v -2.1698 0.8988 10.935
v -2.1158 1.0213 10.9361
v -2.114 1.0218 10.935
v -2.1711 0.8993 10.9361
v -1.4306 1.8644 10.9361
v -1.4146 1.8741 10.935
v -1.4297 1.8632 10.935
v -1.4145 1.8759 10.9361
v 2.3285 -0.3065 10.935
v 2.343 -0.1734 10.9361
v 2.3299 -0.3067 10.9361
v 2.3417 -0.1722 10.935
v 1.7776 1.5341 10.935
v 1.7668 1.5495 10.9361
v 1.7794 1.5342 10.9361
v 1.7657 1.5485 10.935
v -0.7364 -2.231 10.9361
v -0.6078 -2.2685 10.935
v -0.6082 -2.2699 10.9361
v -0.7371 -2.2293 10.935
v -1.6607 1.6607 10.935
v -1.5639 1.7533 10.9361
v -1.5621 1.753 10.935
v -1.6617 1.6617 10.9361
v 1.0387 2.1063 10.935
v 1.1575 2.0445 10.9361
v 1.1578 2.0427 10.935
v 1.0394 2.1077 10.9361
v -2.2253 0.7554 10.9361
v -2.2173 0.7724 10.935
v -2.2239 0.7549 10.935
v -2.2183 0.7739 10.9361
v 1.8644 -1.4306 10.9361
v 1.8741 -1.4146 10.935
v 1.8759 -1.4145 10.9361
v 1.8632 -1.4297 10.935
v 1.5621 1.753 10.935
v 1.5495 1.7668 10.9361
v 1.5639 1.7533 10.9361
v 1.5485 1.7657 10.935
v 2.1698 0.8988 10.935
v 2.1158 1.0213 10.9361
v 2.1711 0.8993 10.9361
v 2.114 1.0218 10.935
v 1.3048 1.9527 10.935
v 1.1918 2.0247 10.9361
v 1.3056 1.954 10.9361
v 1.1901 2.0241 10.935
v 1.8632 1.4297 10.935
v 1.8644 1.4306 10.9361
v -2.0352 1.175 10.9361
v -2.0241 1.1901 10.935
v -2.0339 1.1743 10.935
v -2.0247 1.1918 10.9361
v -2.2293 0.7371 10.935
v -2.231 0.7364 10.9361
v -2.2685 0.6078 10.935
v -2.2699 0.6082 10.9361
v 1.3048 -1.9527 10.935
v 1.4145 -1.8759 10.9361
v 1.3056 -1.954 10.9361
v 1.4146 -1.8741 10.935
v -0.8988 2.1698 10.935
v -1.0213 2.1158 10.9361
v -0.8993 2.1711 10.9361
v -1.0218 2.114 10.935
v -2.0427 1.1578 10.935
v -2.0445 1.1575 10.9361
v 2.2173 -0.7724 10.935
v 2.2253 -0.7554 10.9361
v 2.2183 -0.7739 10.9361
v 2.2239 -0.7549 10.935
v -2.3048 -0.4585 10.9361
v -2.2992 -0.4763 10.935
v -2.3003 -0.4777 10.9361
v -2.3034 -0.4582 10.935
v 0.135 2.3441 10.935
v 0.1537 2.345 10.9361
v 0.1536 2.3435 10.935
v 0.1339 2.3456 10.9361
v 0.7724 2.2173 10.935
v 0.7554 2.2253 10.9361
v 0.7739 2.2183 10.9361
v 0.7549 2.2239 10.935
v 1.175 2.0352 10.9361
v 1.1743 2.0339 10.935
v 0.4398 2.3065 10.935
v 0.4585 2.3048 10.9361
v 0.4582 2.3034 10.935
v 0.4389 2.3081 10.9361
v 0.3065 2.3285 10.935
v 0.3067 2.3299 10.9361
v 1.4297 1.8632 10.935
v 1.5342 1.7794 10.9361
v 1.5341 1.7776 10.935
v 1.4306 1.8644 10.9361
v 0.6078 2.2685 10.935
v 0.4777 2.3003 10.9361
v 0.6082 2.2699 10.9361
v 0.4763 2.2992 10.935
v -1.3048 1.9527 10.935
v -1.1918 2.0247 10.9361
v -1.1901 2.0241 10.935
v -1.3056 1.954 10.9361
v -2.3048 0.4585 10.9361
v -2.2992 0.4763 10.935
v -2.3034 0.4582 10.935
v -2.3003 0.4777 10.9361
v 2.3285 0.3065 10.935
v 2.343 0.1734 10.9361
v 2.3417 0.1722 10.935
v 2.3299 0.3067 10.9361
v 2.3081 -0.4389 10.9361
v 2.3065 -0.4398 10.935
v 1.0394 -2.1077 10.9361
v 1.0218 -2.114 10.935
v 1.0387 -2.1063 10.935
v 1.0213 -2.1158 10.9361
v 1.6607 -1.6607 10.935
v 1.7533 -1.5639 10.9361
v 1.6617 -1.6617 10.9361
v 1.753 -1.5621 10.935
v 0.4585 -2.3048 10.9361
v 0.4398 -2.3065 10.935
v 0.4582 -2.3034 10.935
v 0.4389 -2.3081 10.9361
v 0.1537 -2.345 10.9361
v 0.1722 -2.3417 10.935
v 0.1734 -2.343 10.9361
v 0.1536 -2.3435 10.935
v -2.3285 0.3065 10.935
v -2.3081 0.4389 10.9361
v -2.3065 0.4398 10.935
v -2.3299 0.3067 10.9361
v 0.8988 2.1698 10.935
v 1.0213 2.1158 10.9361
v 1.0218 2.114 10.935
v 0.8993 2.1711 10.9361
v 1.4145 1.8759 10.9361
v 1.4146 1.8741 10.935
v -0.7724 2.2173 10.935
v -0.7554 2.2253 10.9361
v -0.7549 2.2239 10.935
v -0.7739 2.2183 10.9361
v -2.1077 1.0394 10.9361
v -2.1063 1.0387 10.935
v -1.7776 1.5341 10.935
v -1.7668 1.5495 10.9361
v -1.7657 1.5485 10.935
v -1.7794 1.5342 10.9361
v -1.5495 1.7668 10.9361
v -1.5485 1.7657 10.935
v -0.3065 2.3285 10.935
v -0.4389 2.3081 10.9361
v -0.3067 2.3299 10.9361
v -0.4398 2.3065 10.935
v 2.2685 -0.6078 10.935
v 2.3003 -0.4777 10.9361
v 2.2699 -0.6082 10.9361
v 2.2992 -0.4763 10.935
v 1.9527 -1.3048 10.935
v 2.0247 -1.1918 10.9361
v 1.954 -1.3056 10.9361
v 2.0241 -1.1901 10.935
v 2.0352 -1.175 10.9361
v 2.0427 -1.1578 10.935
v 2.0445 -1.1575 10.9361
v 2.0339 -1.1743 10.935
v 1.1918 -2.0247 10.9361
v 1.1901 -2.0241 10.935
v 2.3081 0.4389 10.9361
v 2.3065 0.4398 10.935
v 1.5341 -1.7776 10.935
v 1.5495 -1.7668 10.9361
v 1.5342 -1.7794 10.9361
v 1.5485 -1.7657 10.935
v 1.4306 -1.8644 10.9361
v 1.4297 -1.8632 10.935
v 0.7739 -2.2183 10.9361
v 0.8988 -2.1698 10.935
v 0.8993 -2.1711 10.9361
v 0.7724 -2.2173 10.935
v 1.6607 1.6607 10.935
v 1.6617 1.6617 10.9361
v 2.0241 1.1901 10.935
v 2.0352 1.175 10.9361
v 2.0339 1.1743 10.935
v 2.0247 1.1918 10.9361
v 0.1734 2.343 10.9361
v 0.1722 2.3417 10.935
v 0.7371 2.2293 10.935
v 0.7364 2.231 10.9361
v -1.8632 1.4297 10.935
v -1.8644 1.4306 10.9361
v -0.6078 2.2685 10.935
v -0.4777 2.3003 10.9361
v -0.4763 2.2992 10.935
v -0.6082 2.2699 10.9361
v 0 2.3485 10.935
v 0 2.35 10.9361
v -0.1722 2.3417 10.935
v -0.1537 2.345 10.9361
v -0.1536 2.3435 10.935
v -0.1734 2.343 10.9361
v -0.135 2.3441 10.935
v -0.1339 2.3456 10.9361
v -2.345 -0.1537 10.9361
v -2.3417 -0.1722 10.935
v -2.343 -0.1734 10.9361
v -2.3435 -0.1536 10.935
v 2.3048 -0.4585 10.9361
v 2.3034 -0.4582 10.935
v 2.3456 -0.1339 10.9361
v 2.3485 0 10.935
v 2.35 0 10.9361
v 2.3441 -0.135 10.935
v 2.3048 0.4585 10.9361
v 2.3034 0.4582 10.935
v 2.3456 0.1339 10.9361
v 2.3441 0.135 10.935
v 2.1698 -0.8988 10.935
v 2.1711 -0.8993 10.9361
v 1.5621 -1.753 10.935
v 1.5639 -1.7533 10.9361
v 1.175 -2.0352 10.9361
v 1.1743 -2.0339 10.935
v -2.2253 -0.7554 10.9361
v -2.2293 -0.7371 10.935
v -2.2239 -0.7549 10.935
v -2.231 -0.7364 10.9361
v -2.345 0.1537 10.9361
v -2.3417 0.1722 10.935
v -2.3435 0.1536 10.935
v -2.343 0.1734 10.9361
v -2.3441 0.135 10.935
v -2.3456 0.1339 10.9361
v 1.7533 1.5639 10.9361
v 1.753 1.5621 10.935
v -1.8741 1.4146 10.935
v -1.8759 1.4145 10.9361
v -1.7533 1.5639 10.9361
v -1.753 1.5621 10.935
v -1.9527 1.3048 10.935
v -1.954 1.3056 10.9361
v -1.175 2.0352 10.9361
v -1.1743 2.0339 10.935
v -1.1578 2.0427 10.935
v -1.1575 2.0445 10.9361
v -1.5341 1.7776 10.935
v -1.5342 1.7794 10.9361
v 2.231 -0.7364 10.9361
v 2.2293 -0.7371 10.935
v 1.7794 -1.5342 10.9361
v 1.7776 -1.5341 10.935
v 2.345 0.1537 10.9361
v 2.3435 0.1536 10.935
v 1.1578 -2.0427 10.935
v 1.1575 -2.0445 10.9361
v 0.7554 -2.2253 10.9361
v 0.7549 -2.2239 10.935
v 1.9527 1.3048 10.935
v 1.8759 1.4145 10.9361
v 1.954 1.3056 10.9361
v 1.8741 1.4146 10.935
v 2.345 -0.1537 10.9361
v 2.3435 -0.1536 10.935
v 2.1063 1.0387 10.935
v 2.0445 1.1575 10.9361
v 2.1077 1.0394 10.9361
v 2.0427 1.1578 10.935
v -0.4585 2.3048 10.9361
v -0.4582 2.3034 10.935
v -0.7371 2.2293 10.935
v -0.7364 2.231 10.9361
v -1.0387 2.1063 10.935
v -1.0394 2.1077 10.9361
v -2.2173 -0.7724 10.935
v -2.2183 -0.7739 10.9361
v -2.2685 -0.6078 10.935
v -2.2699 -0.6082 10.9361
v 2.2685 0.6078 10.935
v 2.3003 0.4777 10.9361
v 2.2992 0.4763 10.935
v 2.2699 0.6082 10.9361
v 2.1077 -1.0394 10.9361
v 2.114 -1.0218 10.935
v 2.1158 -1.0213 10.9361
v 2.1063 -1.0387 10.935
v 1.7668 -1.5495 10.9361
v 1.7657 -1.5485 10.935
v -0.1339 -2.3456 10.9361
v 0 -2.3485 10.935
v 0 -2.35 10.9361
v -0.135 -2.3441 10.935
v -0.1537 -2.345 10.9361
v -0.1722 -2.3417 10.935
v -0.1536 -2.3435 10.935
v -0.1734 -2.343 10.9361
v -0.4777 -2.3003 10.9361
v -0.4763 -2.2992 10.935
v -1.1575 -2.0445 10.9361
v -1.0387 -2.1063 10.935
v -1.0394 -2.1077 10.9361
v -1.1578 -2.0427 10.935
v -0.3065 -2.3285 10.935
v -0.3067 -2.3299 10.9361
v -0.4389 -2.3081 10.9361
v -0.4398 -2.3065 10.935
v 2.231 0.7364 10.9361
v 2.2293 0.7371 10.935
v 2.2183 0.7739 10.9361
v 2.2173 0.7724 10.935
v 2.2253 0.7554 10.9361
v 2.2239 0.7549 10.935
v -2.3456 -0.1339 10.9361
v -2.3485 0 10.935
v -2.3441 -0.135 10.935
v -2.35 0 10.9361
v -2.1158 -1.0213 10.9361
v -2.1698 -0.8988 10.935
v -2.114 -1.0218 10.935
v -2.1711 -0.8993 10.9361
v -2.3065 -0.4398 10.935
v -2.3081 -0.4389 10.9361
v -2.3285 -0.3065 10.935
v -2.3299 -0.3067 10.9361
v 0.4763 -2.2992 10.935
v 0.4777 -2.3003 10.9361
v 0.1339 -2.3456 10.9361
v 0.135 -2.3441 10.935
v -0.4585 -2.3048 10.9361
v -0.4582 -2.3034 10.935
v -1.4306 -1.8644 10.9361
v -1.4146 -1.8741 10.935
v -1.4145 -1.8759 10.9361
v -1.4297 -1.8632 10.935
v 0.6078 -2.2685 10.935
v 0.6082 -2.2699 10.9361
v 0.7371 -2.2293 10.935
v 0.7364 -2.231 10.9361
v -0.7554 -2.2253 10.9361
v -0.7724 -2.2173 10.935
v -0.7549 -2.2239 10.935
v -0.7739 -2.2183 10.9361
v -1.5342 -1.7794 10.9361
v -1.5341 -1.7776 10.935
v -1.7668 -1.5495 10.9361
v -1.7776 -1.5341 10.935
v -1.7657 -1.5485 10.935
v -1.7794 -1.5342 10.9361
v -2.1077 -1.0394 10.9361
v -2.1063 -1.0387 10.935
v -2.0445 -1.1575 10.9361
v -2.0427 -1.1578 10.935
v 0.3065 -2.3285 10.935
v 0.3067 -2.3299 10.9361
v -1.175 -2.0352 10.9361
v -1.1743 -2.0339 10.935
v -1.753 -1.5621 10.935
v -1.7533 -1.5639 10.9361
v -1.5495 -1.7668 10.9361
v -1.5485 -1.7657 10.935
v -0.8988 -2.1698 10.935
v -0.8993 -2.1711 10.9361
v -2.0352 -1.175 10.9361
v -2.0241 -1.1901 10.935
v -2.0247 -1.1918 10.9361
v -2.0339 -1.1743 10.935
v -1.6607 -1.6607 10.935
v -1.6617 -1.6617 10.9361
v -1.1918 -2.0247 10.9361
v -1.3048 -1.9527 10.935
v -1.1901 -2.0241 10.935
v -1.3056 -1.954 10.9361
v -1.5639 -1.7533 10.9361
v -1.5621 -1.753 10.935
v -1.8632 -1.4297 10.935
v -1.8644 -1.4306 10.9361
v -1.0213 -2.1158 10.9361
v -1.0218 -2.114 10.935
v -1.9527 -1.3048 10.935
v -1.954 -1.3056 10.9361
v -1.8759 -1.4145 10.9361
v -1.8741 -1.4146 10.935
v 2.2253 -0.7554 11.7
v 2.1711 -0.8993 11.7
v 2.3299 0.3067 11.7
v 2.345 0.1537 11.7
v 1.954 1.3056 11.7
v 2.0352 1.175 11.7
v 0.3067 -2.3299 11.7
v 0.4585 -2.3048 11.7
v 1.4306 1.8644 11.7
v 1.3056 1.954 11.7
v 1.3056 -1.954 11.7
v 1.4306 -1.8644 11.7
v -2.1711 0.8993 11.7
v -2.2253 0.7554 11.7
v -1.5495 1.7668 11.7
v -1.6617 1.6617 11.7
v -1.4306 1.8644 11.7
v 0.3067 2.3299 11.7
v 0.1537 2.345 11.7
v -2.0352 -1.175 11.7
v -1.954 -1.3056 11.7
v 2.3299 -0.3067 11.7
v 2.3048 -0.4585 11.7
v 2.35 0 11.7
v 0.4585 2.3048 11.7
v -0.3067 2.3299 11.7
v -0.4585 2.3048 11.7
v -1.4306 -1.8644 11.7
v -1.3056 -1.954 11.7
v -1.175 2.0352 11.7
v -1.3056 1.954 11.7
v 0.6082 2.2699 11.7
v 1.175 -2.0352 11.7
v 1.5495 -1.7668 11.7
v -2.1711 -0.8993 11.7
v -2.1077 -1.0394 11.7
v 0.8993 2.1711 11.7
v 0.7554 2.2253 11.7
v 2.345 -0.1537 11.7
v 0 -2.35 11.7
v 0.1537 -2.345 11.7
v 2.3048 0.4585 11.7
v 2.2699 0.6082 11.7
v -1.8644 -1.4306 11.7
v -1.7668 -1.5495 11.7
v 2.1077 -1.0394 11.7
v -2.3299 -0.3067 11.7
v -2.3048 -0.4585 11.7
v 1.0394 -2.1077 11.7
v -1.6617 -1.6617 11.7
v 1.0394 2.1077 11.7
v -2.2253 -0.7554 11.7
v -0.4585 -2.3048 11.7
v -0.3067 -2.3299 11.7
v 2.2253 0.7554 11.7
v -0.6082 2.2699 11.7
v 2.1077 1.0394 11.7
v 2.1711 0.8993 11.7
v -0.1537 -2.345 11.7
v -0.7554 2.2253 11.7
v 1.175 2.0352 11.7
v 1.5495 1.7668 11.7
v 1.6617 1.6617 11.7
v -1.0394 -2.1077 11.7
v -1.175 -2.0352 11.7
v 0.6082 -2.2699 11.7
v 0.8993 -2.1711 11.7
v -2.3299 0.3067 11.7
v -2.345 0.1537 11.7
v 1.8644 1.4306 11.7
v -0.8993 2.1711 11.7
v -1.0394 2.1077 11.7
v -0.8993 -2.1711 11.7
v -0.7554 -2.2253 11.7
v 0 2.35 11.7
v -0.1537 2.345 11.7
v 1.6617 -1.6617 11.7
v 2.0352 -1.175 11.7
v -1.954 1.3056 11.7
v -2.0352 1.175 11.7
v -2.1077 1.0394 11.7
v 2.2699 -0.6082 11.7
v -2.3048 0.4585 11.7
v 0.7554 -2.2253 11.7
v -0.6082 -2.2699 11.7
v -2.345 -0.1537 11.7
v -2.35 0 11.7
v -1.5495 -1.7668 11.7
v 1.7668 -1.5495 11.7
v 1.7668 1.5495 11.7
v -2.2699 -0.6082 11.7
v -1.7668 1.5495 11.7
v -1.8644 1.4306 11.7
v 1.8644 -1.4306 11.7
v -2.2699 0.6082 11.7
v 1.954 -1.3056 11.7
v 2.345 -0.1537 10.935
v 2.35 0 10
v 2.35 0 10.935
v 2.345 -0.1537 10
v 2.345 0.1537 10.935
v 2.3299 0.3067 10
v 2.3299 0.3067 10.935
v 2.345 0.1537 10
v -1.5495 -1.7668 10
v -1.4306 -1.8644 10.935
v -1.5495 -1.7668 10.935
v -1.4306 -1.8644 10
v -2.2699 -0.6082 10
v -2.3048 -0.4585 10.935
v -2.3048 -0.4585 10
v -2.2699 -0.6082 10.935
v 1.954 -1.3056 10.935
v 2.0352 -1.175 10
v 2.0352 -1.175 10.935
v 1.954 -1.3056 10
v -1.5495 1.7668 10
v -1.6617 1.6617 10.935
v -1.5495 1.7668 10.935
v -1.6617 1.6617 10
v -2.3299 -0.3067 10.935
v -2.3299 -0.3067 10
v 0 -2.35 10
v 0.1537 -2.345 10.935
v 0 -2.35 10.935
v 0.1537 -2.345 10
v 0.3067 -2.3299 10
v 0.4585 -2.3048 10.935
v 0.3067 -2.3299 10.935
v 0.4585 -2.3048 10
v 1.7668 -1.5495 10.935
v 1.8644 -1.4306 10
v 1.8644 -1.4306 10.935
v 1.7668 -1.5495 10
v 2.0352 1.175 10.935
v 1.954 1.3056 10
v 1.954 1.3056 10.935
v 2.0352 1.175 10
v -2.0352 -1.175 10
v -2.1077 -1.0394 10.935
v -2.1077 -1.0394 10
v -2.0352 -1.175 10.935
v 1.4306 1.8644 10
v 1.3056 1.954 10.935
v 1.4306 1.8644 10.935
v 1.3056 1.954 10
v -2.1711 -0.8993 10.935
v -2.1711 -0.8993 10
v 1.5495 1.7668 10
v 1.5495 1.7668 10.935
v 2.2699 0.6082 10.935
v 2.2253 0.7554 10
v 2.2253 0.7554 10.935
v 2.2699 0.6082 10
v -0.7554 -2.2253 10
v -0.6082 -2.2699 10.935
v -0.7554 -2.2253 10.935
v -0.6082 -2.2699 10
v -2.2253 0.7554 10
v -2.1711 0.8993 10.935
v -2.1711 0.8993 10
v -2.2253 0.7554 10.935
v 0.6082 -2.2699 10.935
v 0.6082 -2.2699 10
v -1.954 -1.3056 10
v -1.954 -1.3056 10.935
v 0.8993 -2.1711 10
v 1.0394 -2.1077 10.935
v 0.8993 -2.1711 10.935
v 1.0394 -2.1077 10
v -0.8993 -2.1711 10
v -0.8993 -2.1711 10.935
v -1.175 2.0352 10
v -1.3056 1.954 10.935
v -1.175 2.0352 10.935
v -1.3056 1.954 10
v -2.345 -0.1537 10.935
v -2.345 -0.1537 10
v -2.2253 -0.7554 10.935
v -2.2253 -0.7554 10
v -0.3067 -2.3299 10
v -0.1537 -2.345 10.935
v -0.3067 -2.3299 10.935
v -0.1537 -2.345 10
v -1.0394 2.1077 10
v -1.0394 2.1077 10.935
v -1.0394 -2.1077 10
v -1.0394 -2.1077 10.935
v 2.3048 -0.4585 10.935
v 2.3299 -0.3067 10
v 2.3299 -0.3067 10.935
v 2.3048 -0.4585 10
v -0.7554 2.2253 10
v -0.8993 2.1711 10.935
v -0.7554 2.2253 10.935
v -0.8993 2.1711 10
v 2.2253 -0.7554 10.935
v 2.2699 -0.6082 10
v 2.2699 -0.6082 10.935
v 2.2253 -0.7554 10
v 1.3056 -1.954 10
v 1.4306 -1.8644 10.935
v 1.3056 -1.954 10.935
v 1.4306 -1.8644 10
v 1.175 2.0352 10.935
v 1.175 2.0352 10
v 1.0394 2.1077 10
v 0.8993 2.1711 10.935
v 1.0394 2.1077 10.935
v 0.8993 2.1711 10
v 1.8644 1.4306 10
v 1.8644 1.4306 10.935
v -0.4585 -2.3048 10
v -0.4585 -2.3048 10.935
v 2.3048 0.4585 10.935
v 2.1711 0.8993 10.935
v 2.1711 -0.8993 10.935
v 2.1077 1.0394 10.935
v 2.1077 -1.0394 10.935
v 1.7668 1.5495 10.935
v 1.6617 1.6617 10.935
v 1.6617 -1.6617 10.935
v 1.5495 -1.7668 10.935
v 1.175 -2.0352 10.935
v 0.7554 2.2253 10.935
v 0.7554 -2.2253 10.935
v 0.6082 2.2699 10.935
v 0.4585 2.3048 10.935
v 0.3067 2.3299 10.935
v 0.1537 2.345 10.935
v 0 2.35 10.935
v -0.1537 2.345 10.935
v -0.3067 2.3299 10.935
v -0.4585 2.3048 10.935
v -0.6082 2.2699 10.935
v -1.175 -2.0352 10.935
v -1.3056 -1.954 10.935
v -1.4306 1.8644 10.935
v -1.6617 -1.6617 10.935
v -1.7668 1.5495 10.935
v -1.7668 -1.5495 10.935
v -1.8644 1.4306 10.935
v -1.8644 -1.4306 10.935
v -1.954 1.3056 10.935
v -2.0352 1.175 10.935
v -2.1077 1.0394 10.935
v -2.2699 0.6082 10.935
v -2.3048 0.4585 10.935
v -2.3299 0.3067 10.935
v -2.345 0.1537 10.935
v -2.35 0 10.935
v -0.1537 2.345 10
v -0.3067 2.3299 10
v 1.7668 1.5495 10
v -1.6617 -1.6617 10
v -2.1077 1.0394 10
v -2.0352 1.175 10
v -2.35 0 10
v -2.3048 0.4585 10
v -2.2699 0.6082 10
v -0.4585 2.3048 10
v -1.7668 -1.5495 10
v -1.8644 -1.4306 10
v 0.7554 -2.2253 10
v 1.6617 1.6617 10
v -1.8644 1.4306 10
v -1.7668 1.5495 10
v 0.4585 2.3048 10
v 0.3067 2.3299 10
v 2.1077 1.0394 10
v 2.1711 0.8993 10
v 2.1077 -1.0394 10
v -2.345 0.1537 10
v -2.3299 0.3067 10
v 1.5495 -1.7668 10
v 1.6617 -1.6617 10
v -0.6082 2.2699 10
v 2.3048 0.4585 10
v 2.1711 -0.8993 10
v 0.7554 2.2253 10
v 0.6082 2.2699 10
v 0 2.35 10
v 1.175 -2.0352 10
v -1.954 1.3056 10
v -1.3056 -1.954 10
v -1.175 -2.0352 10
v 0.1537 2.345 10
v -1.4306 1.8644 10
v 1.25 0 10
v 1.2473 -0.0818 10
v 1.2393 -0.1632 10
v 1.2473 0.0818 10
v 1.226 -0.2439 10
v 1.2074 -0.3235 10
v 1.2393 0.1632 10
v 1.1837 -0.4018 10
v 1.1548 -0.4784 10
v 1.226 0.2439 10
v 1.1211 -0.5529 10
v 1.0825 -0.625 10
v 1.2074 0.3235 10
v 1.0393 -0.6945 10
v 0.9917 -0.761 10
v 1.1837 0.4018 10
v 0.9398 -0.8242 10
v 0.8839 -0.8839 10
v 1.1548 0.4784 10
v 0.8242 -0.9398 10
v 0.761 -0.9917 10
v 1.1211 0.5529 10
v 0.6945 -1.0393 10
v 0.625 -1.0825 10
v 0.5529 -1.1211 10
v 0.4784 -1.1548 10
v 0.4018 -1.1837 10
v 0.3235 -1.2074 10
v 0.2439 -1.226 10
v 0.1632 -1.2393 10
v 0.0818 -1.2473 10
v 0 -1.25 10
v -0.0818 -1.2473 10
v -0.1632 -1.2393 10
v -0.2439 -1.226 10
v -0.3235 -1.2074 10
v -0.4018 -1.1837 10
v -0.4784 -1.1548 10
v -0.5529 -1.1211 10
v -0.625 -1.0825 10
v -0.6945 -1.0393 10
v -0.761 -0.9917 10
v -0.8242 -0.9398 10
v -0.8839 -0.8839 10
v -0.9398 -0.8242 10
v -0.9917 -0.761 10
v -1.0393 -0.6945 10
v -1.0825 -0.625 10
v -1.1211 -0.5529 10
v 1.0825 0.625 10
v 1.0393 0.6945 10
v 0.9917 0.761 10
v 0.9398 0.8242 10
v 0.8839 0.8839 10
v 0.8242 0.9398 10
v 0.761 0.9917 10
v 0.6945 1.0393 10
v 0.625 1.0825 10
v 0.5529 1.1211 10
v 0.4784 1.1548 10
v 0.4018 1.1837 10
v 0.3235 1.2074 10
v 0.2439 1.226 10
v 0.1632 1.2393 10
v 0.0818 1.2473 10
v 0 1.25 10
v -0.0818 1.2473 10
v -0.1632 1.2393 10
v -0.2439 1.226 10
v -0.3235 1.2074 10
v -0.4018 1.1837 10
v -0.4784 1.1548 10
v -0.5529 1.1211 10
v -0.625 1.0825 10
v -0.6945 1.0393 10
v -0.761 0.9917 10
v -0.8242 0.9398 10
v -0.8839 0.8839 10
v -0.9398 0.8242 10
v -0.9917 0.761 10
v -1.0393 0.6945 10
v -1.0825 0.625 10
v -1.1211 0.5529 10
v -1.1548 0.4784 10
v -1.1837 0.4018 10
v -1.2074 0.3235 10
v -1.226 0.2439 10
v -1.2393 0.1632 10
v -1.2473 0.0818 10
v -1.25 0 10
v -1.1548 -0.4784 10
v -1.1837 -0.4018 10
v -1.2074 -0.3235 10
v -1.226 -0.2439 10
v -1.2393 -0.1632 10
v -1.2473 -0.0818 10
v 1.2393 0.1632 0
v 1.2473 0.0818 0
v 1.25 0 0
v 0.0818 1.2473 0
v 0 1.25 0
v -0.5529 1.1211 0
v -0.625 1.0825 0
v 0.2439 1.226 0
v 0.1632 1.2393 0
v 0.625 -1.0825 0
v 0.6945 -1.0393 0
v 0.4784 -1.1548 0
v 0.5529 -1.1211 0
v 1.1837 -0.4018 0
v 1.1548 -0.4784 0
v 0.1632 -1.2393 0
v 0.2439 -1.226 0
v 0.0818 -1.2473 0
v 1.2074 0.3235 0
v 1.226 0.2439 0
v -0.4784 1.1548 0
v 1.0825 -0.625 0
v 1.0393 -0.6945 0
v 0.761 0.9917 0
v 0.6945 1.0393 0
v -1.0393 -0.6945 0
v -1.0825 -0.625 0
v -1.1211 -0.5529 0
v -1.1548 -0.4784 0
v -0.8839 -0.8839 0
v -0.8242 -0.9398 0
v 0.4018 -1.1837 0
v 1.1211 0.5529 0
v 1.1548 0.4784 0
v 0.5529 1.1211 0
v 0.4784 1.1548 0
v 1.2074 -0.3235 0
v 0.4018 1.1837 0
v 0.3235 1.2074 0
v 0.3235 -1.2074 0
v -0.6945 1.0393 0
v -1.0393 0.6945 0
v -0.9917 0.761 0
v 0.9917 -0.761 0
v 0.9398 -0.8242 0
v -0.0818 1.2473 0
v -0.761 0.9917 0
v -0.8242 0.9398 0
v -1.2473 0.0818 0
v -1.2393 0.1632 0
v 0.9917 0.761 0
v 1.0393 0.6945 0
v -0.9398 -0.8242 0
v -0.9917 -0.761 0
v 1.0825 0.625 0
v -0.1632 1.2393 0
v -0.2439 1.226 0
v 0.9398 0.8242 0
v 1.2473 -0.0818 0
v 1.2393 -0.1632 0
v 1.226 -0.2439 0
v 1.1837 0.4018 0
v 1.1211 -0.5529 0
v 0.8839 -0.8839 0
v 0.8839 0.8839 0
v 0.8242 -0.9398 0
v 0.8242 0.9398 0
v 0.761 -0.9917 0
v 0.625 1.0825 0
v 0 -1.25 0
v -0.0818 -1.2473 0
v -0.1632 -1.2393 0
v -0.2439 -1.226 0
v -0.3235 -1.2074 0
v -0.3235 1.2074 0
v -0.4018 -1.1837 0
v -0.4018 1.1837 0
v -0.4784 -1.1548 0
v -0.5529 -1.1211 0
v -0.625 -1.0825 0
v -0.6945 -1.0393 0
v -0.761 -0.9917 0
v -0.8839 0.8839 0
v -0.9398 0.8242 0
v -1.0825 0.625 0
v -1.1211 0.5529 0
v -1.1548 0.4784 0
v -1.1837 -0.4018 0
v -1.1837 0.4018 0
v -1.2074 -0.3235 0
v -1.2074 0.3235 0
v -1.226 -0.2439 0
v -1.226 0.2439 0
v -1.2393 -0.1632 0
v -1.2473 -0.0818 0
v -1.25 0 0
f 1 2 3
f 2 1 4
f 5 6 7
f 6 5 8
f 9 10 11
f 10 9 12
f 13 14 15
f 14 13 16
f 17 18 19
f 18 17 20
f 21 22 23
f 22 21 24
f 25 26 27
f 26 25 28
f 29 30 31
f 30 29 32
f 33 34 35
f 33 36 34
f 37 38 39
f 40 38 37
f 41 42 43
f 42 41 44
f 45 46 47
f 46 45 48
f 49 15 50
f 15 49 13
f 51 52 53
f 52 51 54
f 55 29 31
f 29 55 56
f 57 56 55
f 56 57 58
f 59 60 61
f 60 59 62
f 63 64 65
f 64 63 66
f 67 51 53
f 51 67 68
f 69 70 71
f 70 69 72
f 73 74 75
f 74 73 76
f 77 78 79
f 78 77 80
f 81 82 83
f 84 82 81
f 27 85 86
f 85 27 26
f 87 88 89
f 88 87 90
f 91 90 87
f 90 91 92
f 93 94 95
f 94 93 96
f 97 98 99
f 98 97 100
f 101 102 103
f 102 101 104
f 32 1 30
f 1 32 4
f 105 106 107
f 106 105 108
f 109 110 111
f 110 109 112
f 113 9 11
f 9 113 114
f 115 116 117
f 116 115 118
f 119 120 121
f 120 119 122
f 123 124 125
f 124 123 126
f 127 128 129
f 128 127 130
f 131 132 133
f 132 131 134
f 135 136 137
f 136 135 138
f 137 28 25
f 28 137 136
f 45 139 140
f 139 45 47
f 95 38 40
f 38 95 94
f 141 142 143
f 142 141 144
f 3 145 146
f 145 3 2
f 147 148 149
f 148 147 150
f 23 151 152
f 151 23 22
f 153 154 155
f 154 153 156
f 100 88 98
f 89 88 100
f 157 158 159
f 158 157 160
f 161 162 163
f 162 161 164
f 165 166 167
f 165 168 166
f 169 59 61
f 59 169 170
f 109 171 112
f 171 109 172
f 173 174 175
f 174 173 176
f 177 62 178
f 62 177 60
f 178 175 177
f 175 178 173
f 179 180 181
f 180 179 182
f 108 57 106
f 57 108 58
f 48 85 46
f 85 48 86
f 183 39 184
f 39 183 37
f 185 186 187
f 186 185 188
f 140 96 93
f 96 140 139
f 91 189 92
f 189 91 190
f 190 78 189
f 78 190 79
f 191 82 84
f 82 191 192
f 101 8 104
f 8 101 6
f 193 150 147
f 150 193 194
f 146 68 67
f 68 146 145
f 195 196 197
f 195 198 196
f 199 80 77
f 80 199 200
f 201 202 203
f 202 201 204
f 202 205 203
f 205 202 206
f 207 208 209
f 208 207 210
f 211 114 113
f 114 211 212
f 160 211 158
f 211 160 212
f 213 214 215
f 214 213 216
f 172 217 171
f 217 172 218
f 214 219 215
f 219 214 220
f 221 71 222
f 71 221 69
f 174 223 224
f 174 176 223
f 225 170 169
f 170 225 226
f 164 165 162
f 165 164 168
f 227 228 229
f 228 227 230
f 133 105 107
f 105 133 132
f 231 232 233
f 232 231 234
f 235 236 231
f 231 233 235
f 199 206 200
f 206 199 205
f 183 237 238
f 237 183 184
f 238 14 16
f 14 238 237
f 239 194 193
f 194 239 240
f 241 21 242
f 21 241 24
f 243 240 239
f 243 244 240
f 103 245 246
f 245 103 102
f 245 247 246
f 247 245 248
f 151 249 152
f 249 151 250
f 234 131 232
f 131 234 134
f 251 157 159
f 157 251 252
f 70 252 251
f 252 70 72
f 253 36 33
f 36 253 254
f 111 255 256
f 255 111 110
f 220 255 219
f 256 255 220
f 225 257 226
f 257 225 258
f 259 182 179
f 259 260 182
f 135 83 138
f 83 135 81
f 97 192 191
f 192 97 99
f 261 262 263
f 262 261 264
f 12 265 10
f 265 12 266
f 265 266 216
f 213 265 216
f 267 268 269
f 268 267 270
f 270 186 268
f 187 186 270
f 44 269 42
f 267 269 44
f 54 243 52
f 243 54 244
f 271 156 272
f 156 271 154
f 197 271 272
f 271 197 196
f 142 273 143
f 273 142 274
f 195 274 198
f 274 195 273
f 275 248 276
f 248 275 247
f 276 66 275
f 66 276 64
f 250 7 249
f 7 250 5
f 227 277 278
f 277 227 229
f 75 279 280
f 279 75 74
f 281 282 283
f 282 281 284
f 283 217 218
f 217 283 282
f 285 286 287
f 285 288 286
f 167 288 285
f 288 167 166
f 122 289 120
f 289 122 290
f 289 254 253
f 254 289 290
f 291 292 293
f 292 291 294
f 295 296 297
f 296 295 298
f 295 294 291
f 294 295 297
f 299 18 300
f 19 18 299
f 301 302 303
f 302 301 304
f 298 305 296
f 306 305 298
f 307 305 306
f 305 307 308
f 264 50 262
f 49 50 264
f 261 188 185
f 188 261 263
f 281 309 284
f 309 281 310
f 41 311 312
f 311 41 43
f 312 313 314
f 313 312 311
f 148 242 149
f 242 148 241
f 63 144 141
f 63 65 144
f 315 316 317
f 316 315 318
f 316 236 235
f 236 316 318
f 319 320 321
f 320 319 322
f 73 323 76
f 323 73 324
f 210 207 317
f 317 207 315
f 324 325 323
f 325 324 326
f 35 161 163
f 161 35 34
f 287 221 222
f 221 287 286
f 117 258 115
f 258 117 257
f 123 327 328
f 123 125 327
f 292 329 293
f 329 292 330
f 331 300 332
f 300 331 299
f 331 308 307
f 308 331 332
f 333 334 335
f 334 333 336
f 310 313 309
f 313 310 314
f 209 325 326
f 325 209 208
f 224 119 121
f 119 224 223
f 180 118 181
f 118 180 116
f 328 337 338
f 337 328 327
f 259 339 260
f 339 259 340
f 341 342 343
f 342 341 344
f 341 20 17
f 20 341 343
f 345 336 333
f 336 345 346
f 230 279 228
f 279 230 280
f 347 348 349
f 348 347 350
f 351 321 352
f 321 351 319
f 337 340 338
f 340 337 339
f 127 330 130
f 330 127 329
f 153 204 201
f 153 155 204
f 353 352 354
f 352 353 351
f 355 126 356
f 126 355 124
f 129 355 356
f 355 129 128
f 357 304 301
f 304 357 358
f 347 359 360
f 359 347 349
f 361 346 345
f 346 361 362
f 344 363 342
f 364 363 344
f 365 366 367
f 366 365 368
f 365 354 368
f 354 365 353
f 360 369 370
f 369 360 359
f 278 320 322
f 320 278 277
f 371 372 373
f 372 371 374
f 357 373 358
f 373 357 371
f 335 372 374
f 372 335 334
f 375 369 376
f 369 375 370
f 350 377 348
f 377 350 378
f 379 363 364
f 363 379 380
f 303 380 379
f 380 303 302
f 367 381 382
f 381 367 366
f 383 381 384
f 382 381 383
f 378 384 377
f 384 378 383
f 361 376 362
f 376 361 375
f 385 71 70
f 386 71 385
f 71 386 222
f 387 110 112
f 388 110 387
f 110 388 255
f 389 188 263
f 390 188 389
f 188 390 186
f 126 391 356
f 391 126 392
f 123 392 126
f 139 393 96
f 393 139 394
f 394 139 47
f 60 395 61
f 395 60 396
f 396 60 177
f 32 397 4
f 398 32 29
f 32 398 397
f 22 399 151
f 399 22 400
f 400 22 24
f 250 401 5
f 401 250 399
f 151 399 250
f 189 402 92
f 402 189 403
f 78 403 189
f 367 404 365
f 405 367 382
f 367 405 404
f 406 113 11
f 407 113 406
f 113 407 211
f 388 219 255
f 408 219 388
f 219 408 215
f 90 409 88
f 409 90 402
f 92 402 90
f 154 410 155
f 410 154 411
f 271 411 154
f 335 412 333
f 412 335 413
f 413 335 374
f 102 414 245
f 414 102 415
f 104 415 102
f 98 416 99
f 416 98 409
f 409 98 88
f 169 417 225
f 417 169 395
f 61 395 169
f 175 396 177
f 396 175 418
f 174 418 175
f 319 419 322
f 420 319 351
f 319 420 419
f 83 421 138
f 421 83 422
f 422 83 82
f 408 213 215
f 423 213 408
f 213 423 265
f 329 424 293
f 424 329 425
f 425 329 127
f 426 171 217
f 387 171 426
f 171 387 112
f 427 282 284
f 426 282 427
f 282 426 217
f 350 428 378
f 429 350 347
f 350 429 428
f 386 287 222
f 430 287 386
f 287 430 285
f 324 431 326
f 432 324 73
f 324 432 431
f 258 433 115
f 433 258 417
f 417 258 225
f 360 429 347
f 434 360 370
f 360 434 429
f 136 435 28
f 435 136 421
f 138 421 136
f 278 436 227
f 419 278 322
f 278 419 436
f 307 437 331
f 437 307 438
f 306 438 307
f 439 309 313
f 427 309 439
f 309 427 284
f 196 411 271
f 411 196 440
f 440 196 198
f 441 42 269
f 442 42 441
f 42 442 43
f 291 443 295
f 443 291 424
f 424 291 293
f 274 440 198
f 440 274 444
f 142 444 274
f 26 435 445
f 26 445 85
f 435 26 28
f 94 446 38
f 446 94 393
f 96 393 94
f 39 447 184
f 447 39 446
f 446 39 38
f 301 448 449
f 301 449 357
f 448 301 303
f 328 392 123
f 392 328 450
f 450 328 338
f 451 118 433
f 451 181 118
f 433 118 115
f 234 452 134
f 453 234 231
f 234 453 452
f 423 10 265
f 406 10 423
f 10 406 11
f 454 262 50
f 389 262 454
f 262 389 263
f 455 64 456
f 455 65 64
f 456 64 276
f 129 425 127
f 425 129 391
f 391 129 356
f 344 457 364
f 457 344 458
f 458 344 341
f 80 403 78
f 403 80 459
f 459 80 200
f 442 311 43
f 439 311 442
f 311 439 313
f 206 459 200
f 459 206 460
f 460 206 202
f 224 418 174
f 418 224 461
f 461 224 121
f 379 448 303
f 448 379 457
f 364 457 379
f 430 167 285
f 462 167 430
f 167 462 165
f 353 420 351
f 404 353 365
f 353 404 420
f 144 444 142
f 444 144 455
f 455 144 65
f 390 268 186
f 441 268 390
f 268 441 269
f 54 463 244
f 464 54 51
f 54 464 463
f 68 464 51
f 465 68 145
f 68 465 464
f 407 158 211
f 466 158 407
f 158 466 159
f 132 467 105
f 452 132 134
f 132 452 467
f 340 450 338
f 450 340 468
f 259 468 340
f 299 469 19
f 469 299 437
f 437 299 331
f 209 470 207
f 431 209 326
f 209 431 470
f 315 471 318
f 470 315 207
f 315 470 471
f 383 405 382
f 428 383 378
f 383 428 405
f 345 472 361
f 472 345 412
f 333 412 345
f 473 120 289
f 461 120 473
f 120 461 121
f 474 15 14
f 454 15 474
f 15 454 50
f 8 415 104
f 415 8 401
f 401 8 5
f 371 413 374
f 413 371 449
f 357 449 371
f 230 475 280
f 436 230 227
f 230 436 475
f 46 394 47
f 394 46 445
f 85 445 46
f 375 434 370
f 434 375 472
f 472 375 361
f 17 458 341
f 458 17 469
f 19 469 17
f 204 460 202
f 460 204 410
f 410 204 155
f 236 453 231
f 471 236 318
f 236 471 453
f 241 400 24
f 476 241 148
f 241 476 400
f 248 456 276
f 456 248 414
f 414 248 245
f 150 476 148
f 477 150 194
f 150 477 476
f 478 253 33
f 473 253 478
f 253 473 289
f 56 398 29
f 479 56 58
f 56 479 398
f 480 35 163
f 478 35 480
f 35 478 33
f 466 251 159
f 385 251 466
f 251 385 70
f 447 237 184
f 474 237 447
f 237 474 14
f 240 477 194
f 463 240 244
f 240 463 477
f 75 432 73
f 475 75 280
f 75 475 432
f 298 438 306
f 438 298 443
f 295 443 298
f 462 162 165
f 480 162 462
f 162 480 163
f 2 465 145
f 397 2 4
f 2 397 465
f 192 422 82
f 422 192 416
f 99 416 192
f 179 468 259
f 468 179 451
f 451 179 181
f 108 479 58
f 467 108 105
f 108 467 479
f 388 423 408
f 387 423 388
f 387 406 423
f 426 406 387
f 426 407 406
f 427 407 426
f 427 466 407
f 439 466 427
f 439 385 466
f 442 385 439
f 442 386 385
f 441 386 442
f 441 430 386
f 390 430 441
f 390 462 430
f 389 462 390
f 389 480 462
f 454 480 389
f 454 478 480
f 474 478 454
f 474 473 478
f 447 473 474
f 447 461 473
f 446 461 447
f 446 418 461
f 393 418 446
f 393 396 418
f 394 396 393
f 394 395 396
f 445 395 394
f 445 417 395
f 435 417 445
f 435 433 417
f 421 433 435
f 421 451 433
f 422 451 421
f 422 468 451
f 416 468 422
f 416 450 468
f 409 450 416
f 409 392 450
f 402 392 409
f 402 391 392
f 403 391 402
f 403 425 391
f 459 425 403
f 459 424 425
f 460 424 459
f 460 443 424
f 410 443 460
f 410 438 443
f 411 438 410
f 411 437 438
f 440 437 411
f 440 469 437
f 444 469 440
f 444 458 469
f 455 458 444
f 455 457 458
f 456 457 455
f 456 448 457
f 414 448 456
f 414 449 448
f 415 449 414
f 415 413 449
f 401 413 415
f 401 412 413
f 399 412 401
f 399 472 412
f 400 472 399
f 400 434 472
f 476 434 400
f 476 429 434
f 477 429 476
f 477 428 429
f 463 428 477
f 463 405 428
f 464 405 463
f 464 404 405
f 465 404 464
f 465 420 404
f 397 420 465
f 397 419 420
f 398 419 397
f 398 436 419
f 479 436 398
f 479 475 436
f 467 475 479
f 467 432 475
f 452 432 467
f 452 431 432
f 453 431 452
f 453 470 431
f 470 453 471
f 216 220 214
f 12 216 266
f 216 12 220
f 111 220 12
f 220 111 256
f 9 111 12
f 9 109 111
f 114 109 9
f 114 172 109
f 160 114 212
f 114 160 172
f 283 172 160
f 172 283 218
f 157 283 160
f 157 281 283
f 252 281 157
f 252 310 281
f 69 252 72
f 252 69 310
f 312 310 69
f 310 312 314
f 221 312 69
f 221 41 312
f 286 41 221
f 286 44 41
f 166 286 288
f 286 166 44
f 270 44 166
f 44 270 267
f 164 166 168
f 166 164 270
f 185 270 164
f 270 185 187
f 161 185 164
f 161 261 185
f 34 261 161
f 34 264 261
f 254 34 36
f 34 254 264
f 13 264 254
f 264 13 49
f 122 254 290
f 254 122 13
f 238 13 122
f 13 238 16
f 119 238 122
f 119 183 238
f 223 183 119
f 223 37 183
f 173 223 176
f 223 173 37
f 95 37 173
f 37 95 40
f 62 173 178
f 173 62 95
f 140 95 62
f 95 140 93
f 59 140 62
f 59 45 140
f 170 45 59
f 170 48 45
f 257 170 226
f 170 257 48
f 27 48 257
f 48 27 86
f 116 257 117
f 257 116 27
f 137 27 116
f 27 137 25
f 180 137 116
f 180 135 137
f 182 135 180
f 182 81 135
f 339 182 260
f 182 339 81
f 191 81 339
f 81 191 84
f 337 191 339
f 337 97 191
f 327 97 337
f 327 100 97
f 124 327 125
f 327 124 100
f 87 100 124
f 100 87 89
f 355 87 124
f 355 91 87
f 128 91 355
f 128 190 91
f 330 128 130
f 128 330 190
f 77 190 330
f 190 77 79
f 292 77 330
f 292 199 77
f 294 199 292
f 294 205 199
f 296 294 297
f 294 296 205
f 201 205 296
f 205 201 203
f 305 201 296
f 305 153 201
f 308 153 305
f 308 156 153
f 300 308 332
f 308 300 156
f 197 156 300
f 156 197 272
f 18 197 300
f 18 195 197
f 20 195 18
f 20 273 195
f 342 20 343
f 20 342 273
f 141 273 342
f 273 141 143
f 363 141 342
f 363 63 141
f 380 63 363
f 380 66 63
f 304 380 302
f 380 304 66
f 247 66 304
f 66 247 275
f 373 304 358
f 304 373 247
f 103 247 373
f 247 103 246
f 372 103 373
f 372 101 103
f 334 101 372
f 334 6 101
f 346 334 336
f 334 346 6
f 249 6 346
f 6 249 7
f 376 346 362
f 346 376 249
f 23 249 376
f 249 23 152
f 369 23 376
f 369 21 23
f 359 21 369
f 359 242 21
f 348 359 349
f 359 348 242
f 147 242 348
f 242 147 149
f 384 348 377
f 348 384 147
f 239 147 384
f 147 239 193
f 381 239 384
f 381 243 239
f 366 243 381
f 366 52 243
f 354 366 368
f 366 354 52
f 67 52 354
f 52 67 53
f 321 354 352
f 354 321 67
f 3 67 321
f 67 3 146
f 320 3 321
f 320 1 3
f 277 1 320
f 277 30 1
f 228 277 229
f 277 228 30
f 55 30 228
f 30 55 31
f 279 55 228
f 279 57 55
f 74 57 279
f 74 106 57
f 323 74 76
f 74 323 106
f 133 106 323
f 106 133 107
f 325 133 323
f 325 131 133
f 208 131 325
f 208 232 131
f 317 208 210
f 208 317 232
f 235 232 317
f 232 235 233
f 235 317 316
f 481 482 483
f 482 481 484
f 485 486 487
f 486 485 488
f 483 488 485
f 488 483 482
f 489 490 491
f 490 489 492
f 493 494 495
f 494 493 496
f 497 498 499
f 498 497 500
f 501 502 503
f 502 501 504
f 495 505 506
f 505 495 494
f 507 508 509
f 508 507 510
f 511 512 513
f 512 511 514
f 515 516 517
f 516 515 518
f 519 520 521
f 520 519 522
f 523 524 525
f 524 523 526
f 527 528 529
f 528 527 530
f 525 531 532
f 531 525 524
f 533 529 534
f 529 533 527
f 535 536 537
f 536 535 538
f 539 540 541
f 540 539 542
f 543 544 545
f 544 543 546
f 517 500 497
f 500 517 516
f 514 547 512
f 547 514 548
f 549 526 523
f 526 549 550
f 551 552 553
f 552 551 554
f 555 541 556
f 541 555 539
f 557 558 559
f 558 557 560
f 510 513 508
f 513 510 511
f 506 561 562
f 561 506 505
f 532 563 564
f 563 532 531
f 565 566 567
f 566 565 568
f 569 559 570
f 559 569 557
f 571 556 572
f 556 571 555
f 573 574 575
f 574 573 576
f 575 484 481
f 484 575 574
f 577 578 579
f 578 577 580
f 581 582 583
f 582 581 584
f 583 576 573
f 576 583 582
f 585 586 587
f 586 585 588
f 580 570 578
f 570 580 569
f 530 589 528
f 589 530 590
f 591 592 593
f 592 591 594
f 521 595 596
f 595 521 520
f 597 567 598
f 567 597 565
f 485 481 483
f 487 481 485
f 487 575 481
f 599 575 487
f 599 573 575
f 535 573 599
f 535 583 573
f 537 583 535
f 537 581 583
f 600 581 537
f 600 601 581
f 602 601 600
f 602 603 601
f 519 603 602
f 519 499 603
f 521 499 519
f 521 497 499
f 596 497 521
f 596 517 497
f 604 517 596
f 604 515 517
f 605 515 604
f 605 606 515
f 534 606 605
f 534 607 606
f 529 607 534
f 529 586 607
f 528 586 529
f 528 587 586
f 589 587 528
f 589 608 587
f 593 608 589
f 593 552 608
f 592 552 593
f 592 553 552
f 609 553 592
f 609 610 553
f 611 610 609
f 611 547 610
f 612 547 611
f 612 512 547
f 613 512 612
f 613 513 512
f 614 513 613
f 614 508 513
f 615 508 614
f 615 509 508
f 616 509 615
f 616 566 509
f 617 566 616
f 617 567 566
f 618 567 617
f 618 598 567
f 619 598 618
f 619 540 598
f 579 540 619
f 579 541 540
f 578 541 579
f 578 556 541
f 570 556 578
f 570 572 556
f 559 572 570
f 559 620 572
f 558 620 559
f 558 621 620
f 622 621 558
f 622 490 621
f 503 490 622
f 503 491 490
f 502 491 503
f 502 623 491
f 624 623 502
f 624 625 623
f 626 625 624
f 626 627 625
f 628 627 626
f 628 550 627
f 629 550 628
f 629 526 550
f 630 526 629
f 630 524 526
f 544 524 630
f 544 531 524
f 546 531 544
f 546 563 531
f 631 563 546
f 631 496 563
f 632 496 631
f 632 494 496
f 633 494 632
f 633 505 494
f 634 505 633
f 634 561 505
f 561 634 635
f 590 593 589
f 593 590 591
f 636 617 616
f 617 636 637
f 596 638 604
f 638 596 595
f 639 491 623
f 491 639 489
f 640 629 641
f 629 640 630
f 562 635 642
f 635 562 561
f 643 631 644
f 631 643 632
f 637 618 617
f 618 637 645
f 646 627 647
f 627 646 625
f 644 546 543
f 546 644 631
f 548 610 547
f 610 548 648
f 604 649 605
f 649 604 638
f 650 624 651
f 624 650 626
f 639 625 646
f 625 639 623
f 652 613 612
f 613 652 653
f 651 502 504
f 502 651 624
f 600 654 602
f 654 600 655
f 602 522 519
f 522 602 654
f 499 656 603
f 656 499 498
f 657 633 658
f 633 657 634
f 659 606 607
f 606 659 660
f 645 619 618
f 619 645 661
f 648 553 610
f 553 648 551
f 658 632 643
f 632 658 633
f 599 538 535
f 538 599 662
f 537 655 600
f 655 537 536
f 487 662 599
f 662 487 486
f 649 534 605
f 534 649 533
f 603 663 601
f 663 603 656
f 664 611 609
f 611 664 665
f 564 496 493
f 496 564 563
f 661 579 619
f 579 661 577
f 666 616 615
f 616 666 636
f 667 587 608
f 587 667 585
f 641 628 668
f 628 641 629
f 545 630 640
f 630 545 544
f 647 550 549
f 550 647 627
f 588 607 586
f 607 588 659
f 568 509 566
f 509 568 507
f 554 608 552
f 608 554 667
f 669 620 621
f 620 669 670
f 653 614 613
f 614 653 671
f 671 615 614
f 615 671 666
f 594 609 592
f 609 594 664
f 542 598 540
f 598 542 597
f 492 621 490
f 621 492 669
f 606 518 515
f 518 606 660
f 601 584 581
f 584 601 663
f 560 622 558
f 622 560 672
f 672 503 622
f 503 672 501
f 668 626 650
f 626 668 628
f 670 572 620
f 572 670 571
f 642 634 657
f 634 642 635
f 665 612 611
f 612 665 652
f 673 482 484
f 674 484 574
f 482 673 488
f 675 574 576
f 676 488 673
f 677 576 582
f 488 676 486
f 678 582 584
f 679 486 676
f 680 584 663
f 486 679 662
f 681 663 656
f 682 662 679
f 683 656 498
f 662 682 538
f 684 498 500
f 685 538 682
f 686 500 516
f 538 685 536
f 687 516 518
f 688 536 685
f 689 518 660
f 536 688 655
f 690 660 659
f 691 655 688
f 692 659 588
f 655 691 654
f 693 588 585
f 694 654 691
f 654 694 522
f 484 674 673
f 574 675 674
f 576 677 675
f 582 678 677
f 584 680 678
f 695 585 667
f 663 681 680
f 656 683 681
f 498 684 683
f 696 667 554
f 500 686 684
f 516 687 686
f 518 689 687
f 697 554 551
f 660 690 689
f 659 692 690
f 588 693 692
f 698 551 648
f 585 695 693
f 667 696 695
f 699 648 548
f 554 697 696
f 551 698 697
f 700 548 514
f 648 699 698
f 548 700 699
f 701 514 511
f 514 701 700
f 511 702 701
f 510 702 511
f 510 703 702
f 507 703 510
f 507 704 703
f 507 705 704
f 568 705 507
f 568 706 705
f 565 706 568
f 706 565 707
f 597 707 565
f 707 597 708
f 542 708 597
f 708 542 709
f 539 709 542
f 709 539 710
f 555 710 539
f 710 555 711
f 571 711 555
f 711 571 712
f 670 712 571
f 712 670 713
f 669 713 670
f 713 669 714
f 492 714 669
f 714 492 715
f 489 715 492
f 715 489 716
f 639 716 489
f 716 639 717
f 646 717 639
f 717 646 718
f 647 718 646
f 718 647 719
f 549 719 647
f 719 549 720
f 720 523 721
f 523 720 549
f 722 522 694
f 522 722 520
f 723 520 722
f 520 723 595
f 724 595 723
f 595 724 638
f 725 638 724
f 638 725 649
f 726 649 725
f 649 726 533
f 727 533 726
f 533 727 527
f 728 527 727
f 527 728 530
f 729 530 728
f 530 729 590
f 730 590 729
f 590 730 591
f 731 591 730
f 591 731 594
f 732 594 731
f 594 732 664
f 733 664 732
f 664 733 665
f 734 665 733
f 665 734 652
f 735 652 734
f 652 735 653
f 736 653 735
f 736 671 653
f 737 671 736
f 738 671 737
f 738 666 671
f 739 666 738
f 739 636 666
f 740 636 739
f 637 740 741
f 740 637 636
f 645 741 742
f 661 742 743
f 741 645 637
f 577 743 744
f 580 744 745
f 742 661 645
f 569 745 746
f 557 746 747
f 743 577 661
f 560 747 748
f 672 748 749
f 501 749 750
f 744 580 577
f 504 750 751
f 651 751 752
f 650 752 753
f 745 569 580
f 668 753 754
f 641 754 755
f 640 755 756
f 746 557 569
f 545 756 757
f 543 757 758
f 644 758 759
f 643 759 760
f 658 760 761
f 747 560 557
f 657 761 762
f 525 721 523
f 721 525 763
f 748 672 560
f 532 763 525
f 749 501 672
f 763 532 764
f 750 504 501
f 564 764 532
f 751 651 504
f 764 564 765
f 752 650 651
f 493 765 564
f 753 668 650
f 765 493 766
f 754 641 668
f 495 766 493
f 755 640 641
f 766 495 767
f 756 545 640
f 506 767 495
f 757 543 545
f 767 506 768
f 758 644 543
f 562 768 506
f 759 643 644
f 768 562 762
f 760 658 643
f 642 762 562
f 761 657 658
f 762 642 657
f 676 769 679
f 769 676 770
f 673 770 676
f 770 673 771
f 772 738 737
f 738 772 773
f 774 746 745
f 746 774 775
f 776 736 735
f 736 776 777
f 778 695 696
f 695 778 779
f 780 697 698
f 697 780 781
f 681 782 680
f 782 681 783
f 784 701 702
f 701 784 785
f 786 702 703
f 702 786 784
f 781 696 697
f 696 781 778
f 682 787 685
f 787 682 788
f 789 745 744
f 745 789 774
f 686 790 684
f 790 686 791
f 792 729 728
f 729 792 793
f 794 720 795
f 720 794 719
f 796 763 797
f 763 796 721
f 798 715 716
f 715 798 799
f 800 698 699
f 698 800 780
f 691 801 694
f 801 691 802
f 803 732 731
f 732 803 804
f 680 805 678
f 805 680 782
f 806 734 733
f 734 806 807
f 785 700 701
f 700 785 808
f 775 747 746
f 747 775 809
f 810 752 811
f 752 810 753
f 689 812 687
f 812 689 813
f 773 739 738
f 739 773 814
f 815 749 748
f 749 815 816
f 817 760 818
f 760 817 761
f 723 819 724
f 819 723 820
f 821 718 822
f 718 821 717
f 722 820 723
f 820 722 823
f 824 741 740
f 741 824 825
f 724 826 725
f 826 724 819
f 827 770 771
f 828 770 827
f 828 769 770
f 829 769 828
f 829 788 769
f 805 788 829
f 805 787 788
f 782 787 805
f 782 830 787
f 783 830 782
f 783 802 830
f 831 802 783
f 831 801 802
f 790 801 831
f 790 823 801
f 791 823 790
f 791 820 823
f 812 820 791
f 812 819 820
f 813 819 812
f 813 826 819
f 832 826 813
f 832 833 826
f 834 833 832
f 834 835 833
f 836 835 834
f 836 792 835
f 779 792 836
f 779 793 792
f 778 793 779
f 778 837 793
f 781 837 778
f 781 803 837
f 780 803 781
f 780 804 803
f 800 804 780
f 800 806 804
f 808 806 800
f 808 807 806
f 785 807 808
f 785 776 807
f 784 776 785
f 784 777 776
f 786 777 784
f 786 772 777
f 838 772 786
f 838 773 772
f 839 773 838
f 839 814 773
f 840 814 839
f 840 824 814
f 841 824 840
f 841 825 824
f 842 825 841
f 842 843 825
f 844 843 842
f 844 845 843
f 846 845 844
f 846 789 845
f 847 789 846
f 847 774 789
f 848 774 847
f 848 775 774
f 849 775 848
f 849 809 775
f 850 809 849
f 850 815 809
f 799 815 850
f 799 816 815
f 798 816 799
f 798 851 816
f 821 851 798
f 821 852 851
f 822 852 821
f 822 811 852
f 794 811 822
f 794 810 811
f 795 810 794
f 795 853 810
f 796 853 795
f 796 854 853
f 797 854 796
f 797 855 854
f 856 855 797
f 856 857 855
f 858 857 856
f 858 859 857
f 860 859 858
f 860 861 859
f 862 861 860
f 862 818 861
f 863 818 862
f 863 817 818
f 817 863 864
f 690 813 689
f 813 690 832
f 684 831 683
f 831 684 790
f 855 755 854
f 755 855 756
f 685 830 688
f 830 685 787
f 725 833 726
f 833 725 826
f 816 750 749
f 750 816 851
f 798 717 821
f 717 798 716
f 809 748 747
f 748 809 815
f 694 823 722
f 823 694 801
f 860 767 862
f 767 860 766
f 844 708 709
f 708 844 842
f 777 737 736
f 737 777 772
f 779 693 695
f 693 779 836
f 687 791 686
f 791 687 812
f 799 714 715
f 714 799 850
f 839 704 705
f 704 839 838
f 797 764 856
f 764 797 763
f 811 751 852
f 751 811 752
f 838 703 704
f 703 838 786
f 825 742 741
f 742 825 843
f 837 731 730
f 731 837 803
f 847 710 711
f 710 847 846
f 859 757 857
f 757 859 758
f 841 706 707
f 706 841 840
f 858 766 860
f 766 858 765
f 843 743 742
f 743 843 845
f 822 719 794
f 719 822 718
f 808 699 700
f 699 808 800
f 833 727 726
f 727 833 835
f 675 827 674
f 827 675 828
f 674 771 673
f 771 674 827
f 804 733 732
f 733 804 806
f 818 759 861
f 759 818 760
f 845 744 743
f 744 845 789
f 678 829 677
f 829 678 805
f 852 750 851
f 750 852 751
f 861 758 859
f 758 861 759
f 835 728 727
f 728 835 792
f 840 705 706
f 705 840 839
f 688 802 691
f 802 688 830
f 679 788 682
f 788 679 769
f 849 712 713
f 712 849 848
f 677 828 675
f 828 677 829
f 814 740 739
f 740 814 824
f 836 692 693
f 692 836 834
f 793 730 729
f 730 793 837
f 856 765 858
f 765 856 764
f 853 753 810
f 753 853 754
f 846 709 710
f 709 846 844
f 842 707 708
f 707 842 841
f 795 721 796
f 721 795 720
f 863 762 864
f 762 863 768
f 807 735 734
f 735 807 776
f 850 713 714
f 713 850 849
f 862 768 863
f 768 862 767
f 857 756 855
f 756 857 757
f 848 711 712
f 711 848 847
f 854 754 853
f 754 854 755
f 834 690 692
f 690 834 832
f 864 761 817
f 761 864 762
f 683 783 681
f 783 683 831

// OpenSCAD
$fn = 96;

// Dimensions (mm)
shaft_d = 2.5;
shaft_r = shaft_d/2;

length = 10;          // total length under head
head_d = 4.7;
head_r = head_d/2;
head_h = 1.7;

// Simple pan head profile (approximation)
module pan_head_screw() {
    union() {
        // Shaft (unthreaded approximation)
        cylinder(h = length, r = shaft_r);

        // Head: cylindrical skirt + domed top (spherical cap approximation)
        translate([0,0,length]) {
            union() {
                // Lower cylindrical portion of head
                skirt_h = head_h * 0.55;
                cylinder(h = skirt_h, r = head_r);

                // Domed top portion
                dome_h = head_h - skirt_h;
                // Use a sphere intersected with a cylinder to form a dome
                translate([0,0,skirt_h]) {
                    intersection() {
                        // Sphere sized to create a gentle dome
                        // Radius chosen so cap height ~= dome_h
                        sphere_r = (head_r*head_r + dome_h*dome_h) / (2*dome_h);
                        translate([0,0,sphere_r - dome_h]) sphere(r = sphere_r);
                        cylinder(h = dome_h, r = head_r);
                    }
                }
            }
        }
    }
}

pan_head_screw();
